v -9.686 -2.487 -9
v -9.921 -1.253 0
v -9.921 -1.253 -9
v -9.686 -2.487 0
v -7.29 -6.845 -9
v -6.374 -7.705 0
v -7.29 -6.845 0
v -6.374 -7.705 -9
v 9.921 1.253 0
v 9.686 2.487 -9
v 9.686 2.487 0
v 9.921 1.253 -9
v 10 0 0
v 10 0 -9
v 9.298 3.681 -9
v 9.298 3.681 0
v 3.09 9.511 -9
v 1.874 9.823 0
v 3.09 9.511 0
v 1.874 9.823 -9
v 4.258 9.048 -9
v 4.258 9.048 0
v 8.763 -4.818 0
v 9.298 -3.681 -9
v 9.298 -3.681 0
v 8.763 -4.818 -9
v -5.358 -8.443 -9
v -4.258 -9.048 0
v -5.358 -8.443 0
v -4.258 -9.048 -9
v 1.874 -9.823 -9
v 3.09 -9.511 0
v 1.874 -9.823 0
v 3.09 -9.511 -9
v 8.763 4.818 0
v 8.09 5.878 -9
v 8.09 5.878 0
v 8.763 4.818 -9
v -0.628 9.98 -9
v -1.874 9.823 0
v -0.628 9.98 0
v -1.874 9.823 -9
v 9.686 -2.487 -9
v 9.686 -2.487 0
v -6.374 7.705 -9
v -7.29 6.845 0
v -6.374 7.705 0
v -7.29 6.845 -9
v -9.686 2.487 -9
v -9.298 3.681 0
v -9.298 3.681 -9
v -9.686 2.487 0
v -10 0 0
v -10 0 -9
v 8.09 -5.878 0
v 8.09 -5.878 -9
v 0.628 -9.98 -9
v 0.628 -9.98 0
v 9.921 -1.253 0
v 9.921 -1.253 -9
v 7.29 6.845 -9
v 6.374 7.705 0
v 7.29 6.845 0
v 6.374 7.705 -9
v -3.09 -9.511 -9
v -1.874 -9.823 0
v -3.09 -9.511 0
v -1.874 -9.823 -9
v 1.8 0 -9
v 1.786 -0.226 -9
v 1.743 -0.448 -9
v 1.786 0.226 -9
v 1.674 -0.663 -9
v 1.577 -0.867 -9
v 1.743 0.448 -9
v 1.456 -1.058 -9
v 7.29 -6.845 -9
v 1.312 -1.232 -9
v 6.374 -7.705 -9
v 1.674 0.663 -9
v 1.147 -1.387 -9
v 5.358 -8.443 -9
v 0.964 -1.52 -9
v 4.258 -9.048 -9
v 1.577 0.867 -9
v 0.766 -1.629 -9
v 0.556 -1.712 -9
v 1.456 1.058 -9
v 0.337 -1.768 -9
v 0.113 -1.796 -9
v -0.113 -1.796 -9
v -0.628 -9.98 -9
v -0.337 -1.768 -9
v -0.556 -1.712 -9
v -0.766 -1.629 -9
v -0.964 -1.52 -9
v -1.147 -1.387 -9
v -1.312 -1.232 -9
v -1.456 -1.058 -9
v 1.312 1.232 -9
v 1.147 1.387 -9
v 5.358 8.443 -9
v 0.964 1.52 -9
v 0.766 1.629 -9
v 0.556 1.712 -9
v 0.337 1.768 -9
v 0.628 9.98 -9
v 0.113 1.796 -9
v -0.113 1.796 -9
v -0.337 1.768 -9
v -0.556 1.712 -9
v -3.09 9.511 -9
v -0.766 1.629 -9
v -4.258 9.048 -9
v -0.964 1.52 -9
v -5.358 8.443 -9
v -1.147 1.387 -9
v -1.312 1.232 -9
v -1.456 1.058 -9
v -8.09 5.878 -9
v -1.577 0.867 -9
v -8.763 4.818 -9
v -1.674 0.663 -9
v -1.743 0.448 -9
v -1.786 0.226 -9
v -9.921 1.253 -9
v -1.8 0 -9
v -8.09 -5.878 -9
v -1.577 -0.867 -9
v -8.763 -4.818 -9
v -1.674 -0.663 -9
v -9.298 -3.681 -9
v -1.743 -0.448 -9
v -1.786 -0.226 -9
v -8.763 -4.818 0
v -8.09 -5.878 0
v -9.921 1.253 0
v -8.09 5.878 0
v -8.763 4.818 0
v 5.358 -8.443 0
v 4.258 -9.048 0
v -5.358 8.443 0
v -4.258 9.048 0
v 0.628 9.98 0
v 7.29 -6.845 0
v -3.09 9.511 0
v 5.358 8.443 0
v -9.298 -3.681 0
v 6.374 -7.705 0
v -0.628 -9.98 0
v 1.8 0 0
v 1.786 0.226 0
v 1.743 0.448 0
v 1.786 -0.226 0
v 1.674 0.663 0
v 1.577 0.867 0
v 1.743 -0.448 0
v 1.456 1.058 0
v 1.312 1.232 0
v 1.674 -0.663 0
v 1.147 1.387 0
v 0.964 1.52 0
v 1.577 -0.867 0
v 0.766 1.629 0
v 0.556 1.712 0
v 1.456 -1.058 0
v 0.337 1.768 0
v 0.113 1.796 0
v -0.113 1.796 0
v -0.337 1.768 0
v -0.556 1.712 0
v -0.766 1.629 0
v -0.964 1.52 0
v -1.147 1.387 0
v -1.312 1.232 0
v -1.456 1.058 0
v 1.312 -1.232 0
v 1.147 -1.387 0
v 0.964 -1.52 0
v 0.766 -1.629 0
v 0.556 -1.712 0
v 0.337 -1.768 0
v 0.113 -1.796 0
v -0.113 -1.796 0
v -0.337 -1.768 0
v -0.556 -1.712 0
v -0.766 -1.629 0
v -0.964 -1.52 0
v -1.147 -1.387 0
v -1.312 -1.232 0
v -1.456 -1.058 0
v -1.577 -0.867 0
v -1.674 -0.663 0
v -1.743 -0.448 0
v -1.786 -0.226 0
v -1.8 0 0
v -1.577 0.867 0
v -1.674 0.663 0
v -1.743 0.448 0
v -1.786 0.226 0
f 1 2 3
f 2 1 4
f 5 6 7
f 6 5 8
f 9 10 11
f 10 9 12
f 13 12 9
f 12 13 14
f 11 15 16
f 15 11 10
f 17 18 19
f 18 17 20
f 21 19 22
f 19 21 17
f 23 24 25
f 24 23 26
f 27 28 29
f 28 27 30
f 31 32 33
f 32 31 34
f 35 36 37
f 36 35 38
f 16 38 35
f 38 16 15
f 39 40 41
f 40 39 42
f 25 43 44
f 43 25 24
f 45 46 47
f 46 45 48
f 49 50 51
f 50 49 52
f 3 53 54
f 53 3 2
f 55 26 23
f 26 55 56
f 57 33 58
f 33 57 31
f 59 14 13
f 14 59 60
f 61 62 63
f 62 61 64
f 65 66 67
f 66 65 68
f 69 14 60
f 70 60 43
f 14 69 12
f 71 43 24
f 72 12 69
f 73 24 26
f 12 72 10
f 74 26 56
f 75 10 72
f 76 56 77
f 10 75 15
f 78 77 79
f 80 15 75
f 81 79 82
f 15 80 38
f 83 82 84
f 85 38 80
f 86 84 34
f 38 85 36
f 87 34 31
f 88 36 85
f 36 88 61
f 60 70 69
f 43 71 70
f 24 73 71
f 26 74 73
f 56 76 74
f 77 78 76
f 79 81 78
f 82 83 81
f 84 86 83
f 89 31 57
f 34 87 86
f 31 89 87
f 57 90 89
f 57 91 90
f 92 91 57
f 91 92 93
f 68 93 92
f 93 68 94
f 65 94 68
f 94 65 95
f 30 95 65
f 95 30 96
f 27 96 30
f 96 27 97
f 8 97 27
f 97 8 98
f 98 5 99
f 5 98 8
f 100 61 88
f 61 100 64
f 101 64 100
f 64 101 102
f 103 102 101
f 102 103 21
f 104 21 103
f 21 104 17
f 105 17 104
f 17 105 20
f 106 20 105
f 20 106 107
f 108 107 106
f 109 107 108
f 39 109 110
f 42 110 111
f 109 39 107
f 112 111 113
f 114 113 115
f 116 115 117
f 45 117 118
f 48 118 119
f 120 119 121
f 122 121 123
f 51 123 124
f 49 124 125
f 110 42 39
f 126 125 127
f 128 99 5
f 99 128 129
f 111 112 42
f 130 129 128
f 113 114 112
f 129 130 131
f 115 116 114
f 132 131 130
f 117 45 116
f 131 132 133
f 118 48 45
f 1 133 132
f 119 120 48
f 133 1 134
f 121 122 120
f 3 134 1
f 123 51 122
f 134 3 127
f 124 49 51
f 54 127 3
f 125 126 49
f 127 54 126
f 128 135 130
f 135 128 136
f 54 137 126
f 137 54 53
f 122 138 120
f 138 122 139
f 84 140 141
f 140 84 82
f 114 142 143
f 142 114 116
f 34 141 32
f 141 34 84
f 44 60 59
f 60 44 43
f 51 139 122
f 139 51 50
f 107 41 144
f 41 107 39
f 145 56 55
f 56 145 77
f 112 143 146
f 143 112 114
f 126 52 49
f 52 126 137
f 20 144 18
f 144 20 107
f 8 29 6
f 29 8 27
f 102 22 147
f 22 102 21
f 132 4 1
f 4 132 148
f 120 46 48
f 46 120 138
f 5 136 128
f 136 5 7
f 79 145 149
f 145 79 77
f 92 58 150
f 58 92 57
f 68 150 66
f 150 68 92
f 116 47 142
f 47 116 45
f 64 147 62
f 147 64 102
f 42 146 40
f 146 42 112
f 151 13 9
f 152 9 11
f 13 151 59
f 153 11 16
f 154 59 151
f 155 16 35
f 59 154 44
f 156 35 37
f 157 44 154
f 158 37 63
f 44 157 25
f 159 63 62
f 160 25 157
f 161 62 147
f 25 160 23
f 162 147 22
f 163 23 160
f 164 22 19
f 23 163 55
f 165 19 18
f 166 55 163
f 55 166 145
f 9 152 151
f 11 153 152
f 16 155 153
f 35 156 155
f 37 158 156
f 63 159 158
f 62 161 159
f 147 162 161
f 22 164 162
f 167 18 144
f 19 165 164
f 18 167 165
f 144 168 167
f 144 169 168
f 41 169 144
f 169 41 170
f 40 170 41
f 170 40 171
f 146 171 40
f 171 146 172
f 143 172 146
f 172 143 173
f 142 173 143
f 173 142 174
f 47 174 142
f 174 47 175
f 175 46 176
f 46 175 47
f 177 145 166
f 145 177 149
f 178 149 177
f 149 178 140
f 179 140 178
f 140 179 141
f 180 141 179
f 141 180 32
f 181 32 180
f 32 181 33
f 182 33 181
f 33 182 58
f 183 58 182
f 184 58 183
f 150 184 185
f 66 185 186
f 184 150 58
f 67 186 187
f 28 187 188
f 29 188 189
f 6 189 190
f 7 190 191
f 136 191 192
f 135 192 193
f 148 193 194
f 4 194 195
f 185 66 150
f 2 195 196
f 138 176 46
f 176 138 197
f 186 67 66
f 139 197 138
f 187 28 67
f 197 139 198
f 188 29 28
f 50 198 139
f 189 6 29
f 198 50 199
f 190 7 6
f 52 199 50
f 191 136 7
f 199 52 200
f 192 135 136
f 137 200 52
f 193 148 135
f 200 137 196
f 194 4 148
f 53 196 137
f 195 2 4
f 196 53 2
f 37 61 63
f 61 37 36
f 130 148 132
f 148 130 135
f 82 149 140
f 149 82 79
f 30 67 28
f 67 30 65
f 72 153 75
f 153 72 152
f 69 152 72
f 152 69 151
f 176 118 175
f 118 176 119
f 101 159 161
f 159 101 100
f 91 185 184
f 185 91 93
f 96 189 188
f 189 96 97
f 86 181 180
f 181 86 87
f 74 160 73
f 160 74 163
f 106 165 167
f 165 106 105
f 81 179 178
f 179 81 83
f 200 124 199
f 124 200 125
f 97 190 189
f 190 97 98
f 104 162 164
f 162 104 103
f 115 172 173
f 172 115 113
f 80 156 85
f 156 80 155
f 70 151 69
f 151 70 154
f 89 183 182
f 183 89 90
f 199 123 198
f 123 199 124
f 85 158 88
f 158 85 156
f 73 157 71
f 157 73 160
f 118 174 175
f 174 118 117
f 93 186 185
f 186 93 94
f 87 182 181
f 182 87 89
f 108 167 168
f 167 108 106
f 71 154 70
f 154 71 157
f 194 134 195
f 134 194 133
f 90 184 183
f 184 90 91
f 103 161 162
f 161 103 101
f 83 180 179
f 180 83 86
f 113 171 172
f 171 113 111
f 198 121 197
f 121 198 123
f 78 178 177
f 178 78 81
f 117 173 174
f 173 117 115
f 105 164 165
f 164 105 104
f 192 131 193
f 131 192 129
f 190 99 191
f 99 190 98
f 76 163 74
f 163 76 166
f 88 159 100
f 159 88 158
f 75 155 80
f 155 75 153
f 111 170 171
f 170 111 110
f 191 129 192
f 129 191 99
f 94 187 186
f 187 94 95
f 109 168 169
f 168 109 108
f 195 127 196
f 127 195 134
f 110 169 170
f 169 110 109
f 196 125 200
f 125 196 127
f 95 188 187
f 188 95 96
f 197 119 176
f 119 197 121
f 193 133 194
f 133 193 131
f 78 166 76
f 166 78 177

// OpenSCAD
$fn = 50;


difference() {
	union() {
		translate(v = [0, 0, -9.0000000000]) {
			cylinder(h = 9, r = 10.0000000000);
		}
	}
	union() {
		#translate(v = [0, 0, -9]) {
			cylinder(h = 9, r = 1.8000000000);
		}
	}
}
